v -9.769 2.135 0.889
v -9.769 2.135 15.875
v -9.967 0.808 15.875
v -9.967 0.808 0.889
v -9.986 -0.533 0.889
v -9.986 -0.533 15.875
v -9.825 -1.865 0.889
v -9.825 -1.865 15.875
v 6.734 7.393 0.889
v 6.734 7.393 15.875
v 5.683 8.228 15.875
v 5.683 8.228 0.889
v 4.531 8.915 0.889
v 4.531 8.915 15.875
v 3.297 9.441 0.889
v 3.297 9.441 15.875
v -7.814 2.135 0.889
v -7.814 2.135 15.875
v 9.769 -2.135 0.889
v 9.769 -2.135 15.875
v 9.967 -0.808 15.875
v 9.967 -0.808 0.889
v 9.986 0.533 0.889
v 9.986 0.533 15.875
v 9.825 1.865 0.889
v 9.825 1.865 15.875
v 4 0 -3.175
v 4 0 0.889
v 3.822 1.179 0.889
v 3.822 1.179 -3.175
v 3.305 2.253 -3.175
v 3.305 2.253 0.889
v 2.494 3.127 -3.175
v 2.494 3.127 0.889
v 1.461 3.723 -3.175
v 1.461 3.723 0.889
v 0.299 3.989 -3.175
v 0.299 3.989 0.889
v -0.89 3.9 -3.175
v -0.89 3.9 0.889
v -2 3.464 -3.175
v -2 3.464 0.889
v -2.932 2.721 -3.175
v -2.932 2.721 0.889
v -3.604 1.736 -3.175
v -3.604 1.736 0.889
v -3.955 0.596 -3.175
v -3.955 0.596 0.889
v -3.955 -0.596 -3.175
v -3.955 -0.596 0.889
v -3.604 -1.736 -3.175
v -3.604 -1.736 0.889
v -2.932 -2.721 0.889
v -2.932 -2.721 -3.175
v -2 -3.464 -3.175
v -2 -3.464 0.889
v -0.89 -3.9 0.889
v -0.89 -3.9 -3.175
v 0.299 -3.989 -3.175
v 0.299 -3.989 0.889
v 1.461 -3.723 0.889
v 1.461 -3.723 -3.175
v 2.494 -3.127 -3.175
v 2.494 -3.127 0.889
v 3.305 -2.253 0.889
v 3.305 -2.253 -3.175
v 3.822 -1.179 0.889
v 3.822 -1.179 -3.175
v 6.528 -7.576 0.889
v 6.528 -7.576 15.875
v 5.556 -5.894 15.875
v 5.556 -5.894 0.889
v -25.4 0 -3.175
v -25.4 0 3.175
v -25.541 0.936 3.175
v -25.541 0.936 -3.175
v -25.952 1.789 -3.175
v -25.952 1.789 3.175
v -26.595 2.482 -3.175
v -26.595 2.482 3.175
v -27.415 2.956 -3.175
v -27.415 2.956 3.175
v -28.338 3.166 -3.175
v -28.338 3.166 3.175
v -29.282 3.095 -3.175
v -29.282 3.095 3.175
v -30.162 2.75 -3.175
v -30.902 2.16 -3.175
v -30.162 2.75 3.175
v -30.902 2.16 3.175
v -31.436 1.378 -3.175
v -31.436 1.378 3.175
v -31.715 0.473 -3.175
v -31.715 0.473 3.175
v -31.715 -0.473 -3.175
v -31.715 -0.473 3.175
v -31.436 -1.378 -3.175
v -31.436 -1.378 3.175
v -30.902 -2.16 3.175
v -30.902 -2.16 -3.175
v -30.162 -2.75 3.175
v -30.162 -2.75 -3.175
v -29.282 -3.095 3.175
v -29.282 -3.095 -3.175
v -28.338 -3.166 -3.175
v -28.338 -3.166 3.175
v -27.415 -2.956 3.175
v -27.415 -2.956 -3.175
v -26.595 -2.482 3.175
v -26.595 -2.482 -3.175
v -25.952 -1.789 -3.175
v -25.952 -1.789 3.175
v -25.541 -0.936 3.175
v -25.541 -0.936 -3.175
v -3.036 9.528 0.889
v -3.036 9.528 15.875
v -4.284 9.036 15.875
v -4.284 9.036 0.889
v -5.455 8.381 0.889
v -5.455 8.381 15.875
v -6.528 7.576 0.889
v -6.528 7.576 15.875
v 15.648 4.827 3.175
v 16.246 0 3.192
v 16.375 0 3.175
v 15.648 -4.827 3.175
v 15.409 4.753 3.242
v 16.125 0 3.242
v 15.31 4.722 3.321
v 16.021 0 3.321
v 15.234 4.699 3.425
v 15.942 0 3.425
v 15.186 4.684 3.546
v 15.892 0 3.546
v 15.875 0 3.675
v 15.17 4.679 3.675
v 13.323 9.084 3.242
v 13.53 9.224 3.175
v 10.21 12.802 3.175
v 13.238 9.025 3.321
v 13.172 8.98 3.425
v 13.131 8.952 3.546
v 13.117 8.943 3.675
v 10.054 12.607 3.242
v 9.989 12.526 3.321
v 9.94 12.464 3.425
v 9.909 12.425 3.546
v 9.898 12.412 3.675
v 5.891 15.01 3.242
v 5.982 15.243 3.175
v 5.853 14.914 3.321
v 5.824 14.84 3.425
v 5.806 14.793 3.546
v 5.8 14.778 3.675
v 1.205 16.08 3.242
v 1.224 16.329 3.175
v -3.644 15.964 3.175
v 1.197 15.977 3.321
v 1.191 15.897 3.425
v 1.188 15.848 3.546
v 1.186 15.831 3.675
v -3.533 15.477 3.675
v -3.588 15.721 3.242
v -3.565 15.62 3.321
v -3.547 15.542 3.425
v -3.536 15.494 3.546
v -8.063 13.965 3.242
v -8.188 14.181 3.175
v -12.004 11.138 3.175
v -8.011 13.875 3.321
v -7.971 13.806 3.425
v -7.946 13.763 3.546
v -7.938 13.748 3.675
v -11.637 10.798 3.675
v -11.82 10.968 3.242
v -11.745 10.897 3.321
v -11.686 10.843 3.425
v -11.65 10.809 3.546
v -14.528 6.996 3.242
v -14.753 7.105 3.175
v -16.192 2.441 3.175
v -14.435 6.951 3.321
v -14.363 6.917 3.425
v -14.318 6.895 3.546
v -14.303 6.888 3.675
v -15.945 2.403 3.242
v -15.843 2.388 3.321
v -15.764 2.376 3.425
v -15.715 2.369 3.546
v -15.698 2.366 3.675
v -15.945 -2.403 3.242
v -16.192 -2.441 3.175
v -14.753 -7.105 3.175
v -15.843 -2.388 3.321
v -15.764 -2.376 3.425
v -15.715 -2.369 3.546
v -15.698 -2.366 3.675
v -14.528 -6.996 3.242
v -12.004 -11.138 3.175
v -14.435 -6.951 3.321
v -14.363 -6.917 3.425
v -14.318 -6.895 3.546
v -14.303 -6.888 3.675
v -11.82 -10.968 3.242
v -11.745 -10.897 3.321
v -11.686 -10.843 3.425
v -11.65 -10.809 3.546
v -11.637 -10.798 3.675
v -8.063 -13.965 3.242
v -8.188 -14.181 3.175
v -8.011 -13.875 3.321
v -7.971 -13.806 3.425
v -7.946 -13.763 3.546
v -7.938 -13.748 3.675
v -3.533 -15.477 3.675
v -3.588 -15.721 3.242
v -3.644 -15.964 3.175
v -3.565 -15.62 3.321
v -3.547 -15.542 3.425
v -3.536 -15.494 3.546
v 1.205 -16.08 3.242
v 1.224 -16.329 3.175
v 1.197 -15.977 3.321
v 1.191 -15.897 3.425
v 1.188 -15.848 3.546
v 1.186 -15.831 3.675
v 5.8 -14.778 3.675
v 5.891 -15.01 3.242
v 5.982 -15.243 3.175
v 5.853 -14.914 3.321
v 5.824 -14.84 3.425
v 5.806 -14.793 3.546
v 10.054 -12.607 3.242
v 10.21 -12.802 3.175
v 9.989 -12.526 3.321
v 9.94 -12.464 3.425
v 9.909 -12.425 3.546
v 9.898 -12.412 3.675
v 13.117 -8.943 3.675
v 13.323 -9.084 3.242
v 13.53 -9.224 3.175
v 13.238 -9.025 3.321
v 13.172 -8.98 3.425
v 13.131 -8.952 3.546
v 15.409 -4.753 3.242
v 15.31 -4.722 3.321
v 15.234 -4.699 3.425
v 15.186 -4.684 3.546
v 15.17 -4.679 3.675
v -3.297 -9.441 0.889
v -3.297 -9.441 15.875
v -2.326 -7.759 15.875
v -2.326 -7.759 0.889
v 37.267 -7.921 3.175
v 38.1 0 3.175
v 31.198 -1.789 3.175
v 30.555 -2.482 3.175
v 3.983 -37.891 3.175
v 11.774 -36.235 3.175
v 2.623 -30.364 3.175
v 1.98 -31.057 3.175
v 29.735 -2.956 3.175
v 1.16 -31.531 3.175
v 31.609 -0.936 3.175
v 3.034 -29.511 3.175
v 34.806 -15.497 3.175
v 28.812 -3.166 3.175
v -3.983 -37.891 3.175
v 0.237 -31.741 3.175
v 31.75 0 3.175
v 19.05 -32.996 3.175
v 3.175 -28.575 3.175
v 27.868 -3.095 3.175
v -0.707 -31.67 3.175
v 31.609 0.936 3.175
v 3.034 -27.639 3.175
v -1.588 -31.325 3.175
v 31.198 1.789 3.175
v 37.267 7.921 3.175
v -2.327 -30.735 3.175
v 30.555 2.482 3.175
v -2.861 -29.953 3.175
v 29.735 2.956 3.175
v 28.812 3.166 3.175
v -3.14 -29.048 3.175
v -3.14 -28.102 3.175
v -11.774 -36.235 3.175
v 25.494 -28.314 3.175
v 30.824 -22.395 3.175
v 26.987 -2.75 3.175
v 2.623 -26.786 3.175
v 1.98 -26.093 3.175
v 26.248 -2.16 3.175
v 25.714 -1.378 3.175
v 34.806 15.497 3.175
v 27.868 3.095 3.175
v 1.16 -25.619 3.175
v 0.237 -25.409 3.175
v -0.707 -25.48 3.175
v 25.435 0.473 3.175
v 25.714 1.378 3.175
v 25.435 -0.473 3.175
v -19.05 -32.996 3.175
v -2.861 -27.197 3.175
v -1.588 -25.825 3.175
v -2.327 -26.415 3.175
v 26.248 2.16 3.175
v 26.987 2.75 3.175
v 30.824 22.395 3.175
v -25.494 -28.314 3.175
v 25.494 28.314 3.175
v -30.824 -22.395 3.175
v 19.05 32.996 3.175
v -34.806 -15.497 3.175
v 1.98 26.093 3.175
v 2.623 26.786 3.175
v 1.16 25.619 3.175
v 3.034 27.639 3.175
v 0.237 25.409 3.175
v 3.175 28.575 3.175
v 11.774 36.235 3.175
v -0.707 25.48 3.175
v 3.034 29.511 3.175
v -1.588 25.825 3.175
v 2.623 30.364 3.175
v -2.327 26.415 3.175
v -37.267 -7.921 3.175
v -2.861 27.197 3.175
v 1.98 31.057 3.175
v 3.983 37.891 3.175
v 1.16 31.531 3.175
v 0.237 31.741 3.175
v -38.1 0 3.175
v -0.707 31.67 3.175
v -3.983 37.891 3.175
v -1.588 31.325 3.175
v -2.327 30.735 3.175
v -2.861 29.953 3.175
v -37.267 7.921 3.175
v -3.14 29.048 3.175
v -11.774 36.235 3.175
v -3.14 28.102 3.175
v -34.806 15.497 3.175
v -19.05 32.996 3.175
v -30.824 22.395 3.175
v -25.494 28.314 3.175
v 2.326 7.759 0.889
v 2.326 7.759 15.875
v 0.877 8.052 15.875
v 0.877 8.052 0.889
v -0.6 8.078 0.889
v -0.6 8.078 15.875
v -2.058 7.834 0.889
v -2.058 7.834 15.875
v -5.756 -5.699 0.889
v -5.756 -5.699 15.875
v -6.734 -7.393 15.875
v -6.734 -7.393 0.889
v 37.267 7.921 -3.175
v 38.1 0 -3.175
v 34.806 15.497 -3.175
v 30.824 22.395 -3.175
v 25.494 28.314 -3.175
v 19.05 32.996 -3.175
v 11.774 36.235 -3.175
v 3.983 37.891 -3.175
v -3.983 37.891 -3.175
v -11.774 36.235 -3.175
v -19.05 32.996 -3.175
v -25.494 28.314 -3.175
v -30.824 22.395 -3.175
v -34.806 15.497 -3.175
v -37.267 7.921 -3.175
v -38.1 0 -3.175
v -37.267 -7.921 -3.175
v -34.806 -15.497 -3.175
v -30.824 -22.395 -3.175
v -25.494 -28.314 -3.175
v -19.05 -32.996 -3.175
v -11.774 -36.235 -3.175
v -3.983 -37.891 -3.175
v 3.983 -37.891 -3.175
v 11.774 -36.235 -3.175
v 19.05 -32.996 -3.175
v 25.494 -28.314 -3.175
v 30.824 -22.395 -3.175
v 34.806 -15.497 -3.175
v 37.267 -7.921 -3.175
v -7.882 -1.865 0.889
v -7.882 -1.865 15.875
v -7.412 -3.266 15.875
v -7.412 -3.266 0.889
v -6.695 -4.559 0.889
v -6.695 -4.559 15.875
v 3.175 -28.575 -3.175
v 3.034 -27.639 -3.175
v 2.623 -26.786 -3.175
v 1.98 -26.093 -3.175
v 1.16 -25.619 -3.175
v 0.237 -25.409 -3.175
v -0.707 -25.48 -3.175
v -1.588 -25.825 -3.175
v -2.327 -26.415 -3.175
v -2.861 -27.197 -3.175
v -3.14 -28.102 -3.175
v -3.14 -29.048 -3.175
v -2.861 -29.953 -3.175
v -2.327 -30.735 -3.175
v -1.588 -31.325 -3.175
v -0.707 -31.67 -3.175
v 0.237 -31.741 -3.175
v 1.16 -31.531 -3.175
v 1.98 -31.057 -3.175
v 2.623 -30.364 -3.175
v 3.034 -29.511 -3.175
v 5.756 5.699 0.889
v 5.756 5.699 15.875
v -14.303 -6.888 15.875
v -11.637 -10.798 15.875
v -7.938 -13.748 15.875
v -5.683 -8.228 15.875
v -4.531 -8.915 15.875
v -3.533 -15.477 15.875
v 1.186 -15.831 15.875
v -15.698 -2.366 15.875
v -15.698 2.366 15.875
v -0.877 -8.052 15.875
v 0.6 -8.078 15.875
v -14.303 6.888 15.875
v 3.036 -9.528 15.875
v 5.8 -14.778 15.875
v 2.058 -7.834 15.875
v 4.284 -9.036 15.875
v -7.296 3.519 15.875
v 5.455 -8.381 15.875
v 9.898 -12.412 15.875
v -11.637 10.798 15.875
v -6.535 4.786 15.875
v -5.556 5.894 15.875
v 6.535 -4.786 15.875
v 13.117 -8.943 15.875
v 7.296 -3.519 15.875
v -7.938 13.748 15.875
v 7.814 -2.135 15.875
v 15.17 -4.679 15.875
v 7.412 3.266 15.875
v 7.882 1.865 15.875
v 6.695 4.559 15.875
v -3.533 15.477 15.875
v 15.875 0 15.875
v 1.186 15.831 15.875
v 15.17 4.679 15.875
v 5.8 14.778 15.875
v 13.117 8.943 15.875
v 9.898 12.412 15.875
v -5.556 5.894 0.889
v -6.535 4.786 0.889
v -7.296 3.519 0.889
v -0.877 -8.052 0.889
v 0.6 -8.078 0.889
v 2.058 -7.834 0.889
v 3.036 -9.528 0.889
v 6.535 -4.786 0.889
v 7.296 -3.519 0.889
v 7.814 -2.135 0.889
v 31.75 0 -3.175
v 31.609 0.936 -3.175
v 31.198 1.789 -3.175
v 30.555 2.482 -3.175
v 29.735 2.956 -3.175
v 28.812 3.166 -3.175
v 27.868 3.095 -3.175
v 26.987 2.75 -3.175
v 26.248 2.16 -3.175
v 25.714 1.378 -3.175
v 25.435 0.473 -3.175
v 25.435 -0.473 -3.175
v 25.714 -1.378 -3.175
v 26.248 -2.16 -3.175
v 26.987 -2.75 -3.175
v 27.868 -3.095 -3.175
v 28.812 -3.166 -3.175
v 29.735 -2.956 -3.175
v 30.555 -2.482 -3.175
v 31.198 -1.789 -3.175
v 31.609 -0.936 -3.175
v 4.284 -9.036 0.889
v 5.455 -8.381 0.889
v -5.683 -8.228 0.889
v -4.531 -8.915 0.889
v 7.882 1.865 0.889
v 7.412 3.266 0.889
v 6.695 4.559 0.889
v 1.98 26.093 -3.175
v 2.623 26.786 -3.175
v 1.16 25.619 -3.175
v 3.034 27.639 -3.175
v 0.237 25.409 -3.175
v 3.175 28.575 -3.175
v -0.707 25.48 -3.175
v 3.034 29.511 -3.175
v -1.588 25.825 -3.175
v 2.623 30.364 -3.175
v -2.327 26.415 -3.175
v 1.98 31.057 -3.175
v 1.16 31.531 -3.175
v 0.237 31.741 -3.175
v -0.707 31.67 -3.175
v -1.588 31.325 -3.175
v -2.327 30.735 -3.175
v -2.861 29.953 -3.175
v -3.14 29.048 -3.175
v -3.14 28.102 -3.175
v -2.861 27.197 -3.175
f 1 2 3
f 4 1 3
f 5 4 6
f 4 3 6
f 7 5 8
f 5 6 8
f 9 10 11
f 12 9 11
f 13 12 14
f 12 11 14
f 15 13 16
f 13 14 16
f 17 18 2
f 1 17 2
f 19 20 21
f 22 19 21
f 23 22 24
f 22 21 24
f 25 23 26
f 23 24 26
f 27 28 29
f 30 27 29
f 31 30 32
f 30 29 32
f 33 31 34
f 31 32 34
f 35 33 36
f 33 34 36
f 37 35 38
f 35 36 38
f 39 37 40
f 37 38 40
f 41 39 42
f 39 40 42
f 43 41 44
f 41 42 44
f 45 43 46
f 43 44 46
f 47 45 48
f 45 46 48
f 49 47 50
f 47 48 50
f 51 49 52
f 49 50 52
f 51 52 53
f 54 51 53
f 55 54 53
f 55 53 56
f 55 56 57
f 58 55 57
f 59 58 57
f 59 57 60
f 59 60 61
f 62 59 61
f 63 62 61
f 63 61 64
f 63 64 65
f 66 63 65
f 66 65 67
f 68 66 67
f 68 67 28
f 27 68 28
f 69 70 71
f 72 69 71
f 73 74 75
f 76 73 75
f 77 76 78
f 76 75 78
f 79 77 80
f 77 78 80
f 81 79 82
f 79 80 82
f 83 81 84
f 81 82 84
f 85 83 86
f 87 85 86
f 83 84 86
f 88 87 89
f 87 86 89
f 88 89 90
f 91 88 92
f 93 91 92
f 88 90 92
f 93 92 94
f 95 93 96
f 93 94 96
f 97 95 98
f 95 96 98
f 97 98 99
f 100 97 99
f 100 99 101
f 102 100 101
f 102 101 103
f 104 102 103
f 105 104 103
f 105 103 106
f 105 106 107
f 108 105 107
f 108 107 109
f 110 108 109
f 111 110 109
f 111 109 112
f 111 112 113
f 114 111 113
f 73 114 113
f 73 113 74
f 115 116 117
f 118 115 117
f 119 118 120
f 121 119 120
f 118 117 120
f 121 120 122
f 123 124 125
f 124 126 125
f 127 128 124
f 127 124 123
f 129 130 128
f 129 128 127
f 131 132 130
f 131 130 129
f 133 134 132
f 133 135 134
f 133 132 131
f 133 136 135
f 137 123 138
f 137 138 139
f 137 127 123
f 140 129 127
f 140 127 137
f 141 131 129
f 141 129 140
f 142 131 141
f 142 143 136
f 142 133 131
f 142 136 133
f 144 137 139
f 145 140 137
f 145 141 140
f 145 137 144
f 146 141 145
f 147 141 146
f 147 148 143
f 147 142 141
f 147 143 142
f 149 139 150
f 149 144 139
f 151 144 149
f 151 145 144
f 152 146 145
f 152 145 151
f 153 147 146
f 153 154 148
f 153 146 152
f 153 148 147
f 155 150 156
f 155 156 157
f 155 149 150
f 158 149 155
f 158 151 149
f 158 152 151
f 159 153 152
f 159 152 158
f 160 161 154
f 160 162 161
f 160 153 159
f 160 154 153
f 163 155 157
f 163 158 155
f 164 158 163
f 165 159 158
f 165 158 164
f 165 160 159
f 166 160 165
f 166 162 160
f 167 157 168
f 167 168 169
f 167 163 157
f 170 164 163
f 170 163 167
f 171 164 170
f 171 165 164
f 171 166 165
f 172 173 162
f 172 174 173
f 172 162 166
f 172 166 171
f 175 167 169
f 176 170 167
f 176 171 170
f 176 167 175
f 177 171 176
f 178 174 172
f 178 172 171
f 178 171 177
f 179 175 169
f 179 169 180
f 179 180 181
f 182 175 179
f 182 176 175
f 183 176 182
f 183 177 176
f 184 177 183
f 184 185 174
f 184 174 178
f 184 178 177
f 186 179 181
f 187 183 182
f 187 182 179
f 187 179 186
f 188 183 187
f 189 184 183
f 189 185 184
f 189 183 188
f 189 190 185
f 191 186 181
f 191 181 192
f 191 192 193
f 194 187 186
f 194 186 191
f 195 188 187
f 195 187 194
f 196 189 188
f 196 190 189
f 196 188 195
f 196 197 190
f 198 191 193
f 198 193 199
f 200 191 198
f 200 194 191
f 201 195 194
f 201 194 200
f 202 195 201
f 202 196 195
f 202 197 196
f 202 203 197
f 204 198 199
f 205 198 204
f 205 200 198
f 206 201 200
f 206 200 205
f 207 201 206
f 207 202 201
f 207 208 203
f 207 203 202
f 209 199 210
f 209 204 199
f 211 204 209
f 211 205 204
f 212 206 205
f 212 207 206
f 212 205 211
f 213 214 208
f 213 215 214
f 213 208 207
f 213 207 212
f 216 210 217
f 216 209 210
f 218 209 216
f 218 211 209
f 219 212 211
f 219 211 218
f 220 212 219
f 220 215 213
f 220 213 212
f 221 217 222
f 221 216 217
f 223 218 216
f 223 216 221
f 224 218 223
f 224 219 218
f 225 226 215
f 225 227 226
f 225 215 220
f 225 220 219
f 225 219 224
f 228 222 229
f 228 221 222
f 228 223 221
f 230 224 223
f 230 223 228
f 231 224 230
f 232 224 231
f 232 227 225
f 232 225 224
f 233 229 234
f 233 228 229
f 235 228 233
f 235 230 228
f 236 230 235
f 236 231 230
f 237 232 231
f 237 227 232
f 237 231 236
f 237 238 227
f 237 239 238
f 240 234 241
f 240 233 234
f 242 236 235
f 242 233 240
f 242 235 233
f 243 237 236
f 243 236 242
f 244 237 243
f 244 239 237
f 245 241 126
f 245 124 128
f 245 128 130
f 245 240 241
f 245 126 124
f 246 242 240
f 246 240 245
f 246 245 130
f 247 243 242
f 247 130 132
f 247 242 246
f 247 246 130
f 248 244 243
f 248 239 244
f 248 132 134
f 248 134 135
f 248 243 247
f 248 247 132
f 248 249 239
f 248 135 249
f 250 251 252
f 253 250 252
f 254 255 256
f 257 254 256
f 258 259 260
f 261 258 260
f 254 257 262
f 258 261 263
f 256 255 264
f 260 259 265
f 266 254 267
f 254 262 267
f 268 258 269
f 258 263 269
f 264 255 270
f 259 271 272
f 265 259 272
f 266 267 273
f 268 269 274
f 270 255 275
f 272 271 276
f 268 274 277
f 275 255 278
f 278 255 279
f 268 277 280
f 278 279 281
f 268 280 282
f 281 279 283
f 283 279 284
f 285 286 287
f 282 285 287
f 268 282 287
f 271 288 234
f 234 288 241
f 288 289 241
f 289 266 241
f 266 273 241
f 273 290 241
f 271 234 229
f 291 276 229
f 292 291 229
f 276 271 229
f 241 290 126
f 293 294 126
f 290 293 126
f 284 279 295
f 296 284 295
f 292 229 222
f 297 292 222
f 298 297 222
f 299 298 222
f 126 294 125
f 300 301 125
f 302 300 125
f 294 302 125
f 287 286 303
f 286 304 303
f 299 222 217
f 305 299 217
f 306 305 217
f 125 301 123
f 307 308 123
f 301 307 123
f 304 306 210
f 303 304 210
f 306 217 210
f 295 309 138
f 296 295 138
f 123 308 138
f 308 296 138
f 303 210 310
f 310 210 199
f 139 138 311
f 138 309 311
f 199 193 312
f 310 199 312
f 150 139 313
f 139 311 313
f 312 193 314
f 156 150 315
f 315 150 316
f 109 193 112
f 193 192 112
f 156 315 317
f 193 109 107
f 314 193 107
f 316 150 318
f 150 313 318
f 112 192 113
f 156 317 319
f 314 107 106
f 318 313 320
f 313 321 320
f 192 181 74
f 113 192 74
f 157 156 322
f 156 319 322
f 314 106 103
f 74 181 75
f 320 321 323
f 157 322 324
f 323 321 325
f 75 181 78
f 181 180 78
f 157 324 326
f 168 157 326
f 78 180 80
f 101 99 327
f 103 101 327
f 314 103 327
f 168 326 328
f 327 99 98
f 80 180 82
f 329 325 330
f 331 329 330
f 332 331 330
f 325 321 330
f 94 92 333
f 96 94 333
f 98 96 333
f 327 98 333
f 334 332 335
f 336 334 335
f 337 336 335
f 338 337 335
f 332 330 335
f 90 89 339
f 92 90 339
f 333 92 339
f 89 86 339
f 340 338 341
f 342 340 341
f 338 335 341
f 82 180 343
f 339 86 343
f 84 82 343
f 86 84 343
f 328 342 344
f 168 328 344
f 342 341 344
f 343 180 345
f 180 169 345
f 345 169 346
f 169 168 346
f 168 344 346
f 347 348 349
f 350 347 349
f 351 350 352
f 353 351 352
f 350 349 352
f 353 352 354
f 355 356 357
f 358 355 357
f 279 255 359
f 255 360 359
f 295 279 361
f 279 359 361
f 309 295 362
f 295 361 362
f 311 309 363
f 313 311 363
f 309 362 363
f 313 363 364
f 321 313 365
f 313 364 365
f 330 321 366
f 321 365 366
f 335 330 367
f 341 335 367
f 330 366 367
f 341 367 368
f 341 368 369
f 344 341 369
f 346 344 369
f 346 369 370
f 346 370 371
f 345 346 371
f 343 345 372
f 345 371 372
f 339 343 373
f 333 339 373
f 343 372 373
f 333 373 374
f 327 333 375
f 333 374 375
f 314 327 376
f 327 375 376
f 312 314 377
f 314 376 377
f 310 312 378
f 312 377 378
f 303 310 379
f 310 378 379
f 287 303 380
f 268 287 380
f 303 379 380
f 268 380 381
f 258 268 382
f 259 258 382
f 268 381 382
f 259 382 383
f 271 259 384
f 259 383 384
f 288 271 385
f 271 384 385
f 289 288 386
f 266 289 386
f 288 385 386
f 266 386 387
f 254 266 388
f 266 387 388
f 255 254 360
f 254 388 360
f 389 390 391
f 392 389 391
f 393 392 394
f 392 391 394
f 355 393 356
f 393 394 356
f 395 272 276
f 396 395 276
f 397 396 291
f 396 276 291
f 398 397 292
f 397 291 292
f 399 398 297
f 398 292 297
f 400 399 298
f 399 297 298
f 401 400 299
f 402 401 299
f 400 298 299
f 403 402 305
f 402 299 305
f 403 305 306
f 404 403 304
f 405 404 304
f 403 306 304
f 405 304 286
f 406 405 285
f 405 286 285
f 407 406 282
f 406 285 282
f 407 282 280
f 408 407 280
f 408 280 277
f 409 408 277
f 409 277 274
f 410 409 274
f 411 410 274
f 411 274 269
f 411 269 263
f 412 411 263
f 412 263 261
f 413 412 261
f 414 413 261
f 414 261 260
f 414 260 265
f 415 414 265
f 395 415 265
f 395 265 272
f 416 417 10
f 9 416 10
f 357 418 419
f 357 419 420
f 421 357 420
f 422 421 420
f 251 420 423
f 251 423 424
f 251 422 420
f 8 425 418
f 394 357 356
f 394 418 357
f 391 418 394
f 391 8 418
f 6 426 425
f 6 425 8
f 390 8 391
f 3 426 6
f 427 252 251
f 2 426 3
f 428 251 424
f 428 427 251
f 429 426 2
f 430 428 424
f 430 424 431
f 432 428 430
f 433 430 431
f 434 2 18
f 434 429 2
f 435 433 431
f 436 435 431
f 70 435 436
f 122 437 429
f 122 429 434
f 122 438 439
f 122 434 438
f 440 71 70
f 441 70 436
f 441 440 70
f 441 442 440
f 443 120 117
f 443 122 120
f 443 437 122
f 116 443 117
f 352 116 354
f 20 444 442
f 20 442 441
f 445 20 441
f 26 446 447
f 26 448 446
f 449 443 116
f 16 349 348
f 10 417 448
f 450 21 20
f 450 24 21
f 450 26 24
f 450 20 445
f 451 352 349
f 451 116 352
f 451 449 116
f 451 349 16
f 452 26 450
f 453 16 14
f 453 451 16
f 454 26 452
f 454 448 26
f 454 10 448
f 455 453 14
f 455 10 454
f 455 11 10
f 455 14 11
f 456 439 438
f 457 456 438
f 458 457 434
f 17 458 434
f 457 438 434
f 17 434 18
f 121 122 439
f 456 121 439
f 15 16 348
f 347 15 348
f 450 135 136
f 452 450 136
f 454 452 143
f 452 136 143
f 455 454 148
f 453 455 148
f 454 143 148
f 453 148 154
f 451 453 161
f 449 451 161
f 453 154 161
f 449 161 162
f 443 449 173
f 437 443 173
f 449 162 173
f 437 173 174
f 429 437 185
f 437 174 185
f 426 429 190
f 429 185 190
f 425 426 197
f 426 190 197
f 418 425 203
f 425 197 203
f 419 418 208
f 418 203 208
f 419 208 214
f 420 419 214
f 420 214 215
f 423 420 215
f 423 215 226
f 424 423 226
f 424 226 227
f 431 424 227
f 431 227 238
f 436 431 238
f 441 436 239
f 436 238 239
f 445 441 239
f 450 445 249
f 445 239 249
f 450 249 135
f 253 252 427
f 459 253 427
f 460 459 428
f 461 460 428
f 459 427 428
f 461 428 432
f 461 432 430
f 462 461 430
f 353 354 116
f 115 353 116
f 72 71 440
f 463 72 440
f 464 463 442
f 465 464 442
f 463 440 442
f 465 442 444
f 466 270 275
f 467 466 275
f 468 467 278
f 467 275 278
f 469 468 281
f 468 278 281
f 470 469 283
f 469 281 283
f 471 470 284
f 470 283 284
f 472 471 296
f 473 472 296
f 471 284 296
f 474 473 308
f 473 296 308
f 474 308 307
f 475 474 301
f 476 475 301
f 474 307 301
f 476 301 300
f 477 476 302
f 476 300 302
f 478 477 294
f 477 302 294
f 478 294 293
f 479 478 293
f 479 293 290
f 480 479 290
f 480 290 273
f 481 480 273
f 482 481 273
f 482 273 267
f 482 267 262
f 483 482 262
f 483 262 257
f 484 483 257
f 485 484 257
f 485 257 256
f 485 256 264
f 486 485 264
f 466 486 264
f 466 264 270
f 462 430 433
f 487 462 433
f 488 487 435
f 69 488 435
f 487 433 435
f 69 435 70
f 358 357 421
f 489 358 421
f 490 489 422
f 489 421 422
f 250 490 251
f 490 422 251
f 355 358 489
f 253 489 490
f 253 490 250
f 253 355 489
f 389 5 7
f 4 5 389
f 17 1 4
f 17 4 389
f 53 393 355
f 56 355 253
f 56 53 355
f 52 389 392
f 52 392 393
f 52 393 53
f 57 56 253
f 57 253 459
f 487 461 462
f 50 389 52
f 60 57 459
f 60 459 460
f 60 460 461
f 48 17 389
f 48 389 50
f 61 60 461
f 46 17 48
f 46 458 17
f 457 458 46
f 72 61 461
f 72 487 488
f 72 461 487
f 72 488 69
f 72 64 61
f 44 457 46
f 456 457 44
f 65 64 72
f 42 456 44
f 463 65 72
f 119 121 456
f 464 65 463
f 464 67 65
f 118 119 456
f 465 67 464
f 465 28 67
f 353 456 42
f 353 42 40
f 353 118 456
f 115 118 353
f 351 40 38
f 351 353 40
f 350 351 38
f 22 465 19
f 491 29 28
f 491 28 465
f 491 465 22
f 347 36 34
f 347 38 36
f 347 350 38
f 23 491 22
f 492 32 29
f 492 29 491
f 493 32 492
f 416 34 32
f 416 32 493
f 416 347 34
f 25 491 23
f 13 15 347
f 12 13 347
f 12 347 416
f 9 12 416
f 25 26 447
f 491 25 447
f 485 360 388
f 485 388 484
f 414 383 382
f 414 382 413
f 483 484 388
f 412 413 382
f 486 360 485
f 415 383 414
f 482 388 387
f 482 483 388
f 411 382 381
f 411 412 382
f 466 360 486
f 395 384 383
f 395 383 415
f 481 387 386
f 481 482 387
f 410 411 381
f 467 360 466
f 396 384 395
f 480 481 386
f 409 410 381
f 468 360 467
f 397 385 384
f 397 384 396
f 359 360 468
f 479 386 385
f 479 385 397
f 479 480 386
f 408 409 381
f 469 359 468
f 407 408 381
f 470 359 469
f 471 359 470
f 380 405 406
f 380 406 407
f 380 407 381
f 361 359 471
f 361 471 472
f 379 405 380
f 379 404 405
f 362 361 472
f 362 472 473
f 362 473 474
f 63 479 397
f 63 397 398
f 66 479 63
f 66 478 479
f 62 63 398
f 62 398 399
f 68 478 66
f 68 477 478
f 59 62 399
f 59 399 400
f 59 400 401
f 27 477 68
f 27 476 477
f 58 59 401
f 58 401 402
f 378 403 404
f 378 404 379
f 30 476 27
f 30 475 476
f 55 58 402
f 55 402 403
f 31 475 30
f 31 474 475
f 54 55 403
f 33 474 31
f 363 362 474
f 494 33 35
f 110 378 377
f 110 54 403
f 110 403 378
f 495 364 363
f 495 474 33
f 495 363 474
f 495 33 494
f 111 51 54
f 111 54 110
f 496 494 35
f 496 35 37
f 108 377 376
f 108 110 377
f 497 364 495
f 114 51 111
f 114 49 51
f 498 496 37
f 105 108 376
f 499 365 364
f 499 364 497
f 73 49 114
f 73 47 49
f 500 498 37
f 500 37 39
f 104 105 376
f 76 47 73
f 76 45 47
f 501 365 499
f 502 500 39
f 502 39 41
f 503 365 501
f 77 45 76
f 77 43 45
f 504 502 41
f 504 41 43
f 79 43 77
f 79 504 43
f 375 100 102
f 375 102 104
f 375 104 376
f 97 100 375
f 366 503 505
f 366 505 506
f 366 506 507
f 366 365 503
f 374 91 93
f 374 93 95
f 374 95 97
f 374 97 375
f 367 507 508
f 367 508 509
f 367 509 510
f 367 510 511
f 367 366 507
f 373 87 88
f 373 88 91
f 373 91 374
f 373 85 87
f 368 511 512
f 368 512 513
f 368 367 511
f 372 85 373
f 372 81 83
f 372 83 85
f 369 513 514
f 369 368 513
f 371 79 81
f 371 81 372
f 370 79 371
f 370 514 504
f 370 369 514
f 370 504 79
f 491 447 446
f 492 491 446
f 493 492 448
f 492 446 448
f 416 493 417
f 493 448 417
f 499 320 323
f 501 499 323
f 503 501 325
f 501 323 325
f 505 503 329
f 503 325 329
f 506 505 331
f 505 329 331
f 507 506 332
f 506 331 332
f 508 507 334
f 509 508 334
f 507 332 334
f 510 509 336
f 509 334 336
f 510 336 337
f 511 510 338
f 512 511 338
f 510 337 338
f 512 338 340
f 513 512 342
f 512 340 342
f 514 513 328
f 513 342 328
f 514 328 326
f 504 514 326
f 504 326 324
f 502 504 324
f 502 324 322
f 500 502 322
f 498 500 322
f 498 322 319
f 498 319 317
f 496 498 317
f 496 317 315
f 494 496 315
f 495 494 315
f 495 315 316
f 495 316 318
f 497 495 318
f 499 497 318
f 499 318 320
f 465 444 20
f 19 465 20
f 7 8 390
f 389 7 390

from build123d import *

# Parameters (mm, degrees)
SKETCH1_W           = 38.1
SKETCH1_H           = 6.35
SKETCH2_R           = 15.875
BOSS_EXTRUDE1_DEPTH = 12.7
CUT_EXTRUDE1_DEPTH  = 14.986
HOLE1_D             = 6.35
SKETCH10_R          = 4
CUT_EXTRUDE3_DEPTH  = 10
FILLET2_R           = 0.5


with BuildPart() as part:
    # Sketch1 → Revolve1 (revolve)
    with BuildSketch(Plane(origin=(0, 0, 0), x_dir=(1, 0, 0), z_dir=(0, 1, 0))):
        with Locations((19.05, 0)):
            Rectangle(SKETCH1_W, SKETCH1_H)
    revolve(axis=Axis((0, 0, -3.175), (0, 0, 1)))

    # Sketch2 → Boss-Extrude1 (add)
    with BuildSketch(Plane.XY.offset(3.175)):
        Circle(SKETCH2_R)
    extrude(amount=BOSS_EXTRUDE1_DEPTH)

    # Sketch3 → Cut-Extrude1 (cut)
    with BuildSketch(Plane.XY.offset(15.875)):
        with BuildLine():
            Line((-7.813605563, 2.134846154), (-9.769464259, 2.134846154))
            ThreePointArc((-9.769464259, 2.134846154), (-9.999052891, 0.137627323), (-9.824520402, -1.865153846))
            Line((-9.824520402, -1.865153846), (-7.882334751, -1.865153846))
            ThreePointArc((-7.882334751, -1.865153846), (-7.083348537, -3.928889601), (-5.755633784, -5.699357836))
            Line((-5.755633784, -5.699357836), (-6.733563132, -7.393181152))
            ThreePointArc((-6.733563132, -7.393181152), (-5.118715203, -8.590620156), (-3.296989588, -9.440861171))
            Line((-3.296989588, -9.440861171), (-2.325896763, -7.758879059))
            ThreePointArc((-2.325896763, -7.758879059), (-0.139156065, -8.098804578), (2.057971779, -7.83420399))
            Line((2.057971779, -7.83420399), (3.035901127, -9.528027306))
            ThreePointArc((3.035901127, -9.528027306), (4.880337688, -8.728247479), (6.527530814, -7.575707325))
            Line((6.527530814, -7.575707325), (5.556437988, -5.893725213))
            ThreePointArc((5.556437988, -5.893725213), (6.944192472, -4.169914977), (7.813605563, -2.134846154))
            Line((7.813605563, -2.134846154), (9.769464259, -2.134846154))
            ThreePointArc((9.769464259, -2.134846154), (9.999052891, -0.137627323), (9.824520402, 1.865153846))
            Line((9.824520402, 1.865153846), (7.882334751, 1.865153846))
            ThreePointArc((7.882334751, 1.865153846), (7.083348537, 3.928889601), (5.755633784, 5.699357836))
            Line((5.755633784, 5.699357836), (6.733563132, 7.393181152))
            ThreePointArc((6.733563132, 7.393181152), (5.118715203, 8.590620156), (3.296989588, 9.440861171))
            Line((3.296989588, 9.440861171), (2.325896763, 7.758879059))
            ThreePointArc((2.325896763, 7.758879059), (0.139156065, 8.098804578), (-2.057971779, 7.83420399))
            Line((-2.057971779, 7.83420399), (-3.035901127, 9.528027306))
            ThreePointArc((-3.035901127, 9.528027306), (-4.880337688, 8.728247479), (-6.527530814, 7.575707325))
            Line((-6.527530814, 7.575707325), (-5.556437988, 5.893725213))
            ThreePointArc((-5.556437988, 5.893725213), (-6.944192472, 4.169914977), (-7.813605563, 2.134846154))
        make_face()
    extrude(amount=-CUT_EXTRUDE1_DEPTH, mode=Mode.SUBTRACT)

    # Hole1 (through all)
    with Locations(Plane(origin=(0, 0, -3.175), x_dir=(-1, 0, 0), z_dir=(0, 0, -1))):
        with Locations((0, 28.575), (-28.575, 0), (28.575, 0), (0, -28.575)):
            Hole(HOLE1_D / 2)

    # Sketch10 → Cut-Extrude3 (cut)
    with BuildSketch(Plane.XY.offset(0.889)):
        Circle(SKETCH10_R)
    extrude(amount=-CUT_EXTRUDE3_DEPTH, mode=Mode.SUBTRACT)

    # Fillet2
    fillet2_edges = [part.edges().sort_by_distance(p)[0] for p in [
        (-15.875, 0, 3.175),
    ]]
    fillet(fillet2_edges, radius=FILLET2_R)


solid = part.part
